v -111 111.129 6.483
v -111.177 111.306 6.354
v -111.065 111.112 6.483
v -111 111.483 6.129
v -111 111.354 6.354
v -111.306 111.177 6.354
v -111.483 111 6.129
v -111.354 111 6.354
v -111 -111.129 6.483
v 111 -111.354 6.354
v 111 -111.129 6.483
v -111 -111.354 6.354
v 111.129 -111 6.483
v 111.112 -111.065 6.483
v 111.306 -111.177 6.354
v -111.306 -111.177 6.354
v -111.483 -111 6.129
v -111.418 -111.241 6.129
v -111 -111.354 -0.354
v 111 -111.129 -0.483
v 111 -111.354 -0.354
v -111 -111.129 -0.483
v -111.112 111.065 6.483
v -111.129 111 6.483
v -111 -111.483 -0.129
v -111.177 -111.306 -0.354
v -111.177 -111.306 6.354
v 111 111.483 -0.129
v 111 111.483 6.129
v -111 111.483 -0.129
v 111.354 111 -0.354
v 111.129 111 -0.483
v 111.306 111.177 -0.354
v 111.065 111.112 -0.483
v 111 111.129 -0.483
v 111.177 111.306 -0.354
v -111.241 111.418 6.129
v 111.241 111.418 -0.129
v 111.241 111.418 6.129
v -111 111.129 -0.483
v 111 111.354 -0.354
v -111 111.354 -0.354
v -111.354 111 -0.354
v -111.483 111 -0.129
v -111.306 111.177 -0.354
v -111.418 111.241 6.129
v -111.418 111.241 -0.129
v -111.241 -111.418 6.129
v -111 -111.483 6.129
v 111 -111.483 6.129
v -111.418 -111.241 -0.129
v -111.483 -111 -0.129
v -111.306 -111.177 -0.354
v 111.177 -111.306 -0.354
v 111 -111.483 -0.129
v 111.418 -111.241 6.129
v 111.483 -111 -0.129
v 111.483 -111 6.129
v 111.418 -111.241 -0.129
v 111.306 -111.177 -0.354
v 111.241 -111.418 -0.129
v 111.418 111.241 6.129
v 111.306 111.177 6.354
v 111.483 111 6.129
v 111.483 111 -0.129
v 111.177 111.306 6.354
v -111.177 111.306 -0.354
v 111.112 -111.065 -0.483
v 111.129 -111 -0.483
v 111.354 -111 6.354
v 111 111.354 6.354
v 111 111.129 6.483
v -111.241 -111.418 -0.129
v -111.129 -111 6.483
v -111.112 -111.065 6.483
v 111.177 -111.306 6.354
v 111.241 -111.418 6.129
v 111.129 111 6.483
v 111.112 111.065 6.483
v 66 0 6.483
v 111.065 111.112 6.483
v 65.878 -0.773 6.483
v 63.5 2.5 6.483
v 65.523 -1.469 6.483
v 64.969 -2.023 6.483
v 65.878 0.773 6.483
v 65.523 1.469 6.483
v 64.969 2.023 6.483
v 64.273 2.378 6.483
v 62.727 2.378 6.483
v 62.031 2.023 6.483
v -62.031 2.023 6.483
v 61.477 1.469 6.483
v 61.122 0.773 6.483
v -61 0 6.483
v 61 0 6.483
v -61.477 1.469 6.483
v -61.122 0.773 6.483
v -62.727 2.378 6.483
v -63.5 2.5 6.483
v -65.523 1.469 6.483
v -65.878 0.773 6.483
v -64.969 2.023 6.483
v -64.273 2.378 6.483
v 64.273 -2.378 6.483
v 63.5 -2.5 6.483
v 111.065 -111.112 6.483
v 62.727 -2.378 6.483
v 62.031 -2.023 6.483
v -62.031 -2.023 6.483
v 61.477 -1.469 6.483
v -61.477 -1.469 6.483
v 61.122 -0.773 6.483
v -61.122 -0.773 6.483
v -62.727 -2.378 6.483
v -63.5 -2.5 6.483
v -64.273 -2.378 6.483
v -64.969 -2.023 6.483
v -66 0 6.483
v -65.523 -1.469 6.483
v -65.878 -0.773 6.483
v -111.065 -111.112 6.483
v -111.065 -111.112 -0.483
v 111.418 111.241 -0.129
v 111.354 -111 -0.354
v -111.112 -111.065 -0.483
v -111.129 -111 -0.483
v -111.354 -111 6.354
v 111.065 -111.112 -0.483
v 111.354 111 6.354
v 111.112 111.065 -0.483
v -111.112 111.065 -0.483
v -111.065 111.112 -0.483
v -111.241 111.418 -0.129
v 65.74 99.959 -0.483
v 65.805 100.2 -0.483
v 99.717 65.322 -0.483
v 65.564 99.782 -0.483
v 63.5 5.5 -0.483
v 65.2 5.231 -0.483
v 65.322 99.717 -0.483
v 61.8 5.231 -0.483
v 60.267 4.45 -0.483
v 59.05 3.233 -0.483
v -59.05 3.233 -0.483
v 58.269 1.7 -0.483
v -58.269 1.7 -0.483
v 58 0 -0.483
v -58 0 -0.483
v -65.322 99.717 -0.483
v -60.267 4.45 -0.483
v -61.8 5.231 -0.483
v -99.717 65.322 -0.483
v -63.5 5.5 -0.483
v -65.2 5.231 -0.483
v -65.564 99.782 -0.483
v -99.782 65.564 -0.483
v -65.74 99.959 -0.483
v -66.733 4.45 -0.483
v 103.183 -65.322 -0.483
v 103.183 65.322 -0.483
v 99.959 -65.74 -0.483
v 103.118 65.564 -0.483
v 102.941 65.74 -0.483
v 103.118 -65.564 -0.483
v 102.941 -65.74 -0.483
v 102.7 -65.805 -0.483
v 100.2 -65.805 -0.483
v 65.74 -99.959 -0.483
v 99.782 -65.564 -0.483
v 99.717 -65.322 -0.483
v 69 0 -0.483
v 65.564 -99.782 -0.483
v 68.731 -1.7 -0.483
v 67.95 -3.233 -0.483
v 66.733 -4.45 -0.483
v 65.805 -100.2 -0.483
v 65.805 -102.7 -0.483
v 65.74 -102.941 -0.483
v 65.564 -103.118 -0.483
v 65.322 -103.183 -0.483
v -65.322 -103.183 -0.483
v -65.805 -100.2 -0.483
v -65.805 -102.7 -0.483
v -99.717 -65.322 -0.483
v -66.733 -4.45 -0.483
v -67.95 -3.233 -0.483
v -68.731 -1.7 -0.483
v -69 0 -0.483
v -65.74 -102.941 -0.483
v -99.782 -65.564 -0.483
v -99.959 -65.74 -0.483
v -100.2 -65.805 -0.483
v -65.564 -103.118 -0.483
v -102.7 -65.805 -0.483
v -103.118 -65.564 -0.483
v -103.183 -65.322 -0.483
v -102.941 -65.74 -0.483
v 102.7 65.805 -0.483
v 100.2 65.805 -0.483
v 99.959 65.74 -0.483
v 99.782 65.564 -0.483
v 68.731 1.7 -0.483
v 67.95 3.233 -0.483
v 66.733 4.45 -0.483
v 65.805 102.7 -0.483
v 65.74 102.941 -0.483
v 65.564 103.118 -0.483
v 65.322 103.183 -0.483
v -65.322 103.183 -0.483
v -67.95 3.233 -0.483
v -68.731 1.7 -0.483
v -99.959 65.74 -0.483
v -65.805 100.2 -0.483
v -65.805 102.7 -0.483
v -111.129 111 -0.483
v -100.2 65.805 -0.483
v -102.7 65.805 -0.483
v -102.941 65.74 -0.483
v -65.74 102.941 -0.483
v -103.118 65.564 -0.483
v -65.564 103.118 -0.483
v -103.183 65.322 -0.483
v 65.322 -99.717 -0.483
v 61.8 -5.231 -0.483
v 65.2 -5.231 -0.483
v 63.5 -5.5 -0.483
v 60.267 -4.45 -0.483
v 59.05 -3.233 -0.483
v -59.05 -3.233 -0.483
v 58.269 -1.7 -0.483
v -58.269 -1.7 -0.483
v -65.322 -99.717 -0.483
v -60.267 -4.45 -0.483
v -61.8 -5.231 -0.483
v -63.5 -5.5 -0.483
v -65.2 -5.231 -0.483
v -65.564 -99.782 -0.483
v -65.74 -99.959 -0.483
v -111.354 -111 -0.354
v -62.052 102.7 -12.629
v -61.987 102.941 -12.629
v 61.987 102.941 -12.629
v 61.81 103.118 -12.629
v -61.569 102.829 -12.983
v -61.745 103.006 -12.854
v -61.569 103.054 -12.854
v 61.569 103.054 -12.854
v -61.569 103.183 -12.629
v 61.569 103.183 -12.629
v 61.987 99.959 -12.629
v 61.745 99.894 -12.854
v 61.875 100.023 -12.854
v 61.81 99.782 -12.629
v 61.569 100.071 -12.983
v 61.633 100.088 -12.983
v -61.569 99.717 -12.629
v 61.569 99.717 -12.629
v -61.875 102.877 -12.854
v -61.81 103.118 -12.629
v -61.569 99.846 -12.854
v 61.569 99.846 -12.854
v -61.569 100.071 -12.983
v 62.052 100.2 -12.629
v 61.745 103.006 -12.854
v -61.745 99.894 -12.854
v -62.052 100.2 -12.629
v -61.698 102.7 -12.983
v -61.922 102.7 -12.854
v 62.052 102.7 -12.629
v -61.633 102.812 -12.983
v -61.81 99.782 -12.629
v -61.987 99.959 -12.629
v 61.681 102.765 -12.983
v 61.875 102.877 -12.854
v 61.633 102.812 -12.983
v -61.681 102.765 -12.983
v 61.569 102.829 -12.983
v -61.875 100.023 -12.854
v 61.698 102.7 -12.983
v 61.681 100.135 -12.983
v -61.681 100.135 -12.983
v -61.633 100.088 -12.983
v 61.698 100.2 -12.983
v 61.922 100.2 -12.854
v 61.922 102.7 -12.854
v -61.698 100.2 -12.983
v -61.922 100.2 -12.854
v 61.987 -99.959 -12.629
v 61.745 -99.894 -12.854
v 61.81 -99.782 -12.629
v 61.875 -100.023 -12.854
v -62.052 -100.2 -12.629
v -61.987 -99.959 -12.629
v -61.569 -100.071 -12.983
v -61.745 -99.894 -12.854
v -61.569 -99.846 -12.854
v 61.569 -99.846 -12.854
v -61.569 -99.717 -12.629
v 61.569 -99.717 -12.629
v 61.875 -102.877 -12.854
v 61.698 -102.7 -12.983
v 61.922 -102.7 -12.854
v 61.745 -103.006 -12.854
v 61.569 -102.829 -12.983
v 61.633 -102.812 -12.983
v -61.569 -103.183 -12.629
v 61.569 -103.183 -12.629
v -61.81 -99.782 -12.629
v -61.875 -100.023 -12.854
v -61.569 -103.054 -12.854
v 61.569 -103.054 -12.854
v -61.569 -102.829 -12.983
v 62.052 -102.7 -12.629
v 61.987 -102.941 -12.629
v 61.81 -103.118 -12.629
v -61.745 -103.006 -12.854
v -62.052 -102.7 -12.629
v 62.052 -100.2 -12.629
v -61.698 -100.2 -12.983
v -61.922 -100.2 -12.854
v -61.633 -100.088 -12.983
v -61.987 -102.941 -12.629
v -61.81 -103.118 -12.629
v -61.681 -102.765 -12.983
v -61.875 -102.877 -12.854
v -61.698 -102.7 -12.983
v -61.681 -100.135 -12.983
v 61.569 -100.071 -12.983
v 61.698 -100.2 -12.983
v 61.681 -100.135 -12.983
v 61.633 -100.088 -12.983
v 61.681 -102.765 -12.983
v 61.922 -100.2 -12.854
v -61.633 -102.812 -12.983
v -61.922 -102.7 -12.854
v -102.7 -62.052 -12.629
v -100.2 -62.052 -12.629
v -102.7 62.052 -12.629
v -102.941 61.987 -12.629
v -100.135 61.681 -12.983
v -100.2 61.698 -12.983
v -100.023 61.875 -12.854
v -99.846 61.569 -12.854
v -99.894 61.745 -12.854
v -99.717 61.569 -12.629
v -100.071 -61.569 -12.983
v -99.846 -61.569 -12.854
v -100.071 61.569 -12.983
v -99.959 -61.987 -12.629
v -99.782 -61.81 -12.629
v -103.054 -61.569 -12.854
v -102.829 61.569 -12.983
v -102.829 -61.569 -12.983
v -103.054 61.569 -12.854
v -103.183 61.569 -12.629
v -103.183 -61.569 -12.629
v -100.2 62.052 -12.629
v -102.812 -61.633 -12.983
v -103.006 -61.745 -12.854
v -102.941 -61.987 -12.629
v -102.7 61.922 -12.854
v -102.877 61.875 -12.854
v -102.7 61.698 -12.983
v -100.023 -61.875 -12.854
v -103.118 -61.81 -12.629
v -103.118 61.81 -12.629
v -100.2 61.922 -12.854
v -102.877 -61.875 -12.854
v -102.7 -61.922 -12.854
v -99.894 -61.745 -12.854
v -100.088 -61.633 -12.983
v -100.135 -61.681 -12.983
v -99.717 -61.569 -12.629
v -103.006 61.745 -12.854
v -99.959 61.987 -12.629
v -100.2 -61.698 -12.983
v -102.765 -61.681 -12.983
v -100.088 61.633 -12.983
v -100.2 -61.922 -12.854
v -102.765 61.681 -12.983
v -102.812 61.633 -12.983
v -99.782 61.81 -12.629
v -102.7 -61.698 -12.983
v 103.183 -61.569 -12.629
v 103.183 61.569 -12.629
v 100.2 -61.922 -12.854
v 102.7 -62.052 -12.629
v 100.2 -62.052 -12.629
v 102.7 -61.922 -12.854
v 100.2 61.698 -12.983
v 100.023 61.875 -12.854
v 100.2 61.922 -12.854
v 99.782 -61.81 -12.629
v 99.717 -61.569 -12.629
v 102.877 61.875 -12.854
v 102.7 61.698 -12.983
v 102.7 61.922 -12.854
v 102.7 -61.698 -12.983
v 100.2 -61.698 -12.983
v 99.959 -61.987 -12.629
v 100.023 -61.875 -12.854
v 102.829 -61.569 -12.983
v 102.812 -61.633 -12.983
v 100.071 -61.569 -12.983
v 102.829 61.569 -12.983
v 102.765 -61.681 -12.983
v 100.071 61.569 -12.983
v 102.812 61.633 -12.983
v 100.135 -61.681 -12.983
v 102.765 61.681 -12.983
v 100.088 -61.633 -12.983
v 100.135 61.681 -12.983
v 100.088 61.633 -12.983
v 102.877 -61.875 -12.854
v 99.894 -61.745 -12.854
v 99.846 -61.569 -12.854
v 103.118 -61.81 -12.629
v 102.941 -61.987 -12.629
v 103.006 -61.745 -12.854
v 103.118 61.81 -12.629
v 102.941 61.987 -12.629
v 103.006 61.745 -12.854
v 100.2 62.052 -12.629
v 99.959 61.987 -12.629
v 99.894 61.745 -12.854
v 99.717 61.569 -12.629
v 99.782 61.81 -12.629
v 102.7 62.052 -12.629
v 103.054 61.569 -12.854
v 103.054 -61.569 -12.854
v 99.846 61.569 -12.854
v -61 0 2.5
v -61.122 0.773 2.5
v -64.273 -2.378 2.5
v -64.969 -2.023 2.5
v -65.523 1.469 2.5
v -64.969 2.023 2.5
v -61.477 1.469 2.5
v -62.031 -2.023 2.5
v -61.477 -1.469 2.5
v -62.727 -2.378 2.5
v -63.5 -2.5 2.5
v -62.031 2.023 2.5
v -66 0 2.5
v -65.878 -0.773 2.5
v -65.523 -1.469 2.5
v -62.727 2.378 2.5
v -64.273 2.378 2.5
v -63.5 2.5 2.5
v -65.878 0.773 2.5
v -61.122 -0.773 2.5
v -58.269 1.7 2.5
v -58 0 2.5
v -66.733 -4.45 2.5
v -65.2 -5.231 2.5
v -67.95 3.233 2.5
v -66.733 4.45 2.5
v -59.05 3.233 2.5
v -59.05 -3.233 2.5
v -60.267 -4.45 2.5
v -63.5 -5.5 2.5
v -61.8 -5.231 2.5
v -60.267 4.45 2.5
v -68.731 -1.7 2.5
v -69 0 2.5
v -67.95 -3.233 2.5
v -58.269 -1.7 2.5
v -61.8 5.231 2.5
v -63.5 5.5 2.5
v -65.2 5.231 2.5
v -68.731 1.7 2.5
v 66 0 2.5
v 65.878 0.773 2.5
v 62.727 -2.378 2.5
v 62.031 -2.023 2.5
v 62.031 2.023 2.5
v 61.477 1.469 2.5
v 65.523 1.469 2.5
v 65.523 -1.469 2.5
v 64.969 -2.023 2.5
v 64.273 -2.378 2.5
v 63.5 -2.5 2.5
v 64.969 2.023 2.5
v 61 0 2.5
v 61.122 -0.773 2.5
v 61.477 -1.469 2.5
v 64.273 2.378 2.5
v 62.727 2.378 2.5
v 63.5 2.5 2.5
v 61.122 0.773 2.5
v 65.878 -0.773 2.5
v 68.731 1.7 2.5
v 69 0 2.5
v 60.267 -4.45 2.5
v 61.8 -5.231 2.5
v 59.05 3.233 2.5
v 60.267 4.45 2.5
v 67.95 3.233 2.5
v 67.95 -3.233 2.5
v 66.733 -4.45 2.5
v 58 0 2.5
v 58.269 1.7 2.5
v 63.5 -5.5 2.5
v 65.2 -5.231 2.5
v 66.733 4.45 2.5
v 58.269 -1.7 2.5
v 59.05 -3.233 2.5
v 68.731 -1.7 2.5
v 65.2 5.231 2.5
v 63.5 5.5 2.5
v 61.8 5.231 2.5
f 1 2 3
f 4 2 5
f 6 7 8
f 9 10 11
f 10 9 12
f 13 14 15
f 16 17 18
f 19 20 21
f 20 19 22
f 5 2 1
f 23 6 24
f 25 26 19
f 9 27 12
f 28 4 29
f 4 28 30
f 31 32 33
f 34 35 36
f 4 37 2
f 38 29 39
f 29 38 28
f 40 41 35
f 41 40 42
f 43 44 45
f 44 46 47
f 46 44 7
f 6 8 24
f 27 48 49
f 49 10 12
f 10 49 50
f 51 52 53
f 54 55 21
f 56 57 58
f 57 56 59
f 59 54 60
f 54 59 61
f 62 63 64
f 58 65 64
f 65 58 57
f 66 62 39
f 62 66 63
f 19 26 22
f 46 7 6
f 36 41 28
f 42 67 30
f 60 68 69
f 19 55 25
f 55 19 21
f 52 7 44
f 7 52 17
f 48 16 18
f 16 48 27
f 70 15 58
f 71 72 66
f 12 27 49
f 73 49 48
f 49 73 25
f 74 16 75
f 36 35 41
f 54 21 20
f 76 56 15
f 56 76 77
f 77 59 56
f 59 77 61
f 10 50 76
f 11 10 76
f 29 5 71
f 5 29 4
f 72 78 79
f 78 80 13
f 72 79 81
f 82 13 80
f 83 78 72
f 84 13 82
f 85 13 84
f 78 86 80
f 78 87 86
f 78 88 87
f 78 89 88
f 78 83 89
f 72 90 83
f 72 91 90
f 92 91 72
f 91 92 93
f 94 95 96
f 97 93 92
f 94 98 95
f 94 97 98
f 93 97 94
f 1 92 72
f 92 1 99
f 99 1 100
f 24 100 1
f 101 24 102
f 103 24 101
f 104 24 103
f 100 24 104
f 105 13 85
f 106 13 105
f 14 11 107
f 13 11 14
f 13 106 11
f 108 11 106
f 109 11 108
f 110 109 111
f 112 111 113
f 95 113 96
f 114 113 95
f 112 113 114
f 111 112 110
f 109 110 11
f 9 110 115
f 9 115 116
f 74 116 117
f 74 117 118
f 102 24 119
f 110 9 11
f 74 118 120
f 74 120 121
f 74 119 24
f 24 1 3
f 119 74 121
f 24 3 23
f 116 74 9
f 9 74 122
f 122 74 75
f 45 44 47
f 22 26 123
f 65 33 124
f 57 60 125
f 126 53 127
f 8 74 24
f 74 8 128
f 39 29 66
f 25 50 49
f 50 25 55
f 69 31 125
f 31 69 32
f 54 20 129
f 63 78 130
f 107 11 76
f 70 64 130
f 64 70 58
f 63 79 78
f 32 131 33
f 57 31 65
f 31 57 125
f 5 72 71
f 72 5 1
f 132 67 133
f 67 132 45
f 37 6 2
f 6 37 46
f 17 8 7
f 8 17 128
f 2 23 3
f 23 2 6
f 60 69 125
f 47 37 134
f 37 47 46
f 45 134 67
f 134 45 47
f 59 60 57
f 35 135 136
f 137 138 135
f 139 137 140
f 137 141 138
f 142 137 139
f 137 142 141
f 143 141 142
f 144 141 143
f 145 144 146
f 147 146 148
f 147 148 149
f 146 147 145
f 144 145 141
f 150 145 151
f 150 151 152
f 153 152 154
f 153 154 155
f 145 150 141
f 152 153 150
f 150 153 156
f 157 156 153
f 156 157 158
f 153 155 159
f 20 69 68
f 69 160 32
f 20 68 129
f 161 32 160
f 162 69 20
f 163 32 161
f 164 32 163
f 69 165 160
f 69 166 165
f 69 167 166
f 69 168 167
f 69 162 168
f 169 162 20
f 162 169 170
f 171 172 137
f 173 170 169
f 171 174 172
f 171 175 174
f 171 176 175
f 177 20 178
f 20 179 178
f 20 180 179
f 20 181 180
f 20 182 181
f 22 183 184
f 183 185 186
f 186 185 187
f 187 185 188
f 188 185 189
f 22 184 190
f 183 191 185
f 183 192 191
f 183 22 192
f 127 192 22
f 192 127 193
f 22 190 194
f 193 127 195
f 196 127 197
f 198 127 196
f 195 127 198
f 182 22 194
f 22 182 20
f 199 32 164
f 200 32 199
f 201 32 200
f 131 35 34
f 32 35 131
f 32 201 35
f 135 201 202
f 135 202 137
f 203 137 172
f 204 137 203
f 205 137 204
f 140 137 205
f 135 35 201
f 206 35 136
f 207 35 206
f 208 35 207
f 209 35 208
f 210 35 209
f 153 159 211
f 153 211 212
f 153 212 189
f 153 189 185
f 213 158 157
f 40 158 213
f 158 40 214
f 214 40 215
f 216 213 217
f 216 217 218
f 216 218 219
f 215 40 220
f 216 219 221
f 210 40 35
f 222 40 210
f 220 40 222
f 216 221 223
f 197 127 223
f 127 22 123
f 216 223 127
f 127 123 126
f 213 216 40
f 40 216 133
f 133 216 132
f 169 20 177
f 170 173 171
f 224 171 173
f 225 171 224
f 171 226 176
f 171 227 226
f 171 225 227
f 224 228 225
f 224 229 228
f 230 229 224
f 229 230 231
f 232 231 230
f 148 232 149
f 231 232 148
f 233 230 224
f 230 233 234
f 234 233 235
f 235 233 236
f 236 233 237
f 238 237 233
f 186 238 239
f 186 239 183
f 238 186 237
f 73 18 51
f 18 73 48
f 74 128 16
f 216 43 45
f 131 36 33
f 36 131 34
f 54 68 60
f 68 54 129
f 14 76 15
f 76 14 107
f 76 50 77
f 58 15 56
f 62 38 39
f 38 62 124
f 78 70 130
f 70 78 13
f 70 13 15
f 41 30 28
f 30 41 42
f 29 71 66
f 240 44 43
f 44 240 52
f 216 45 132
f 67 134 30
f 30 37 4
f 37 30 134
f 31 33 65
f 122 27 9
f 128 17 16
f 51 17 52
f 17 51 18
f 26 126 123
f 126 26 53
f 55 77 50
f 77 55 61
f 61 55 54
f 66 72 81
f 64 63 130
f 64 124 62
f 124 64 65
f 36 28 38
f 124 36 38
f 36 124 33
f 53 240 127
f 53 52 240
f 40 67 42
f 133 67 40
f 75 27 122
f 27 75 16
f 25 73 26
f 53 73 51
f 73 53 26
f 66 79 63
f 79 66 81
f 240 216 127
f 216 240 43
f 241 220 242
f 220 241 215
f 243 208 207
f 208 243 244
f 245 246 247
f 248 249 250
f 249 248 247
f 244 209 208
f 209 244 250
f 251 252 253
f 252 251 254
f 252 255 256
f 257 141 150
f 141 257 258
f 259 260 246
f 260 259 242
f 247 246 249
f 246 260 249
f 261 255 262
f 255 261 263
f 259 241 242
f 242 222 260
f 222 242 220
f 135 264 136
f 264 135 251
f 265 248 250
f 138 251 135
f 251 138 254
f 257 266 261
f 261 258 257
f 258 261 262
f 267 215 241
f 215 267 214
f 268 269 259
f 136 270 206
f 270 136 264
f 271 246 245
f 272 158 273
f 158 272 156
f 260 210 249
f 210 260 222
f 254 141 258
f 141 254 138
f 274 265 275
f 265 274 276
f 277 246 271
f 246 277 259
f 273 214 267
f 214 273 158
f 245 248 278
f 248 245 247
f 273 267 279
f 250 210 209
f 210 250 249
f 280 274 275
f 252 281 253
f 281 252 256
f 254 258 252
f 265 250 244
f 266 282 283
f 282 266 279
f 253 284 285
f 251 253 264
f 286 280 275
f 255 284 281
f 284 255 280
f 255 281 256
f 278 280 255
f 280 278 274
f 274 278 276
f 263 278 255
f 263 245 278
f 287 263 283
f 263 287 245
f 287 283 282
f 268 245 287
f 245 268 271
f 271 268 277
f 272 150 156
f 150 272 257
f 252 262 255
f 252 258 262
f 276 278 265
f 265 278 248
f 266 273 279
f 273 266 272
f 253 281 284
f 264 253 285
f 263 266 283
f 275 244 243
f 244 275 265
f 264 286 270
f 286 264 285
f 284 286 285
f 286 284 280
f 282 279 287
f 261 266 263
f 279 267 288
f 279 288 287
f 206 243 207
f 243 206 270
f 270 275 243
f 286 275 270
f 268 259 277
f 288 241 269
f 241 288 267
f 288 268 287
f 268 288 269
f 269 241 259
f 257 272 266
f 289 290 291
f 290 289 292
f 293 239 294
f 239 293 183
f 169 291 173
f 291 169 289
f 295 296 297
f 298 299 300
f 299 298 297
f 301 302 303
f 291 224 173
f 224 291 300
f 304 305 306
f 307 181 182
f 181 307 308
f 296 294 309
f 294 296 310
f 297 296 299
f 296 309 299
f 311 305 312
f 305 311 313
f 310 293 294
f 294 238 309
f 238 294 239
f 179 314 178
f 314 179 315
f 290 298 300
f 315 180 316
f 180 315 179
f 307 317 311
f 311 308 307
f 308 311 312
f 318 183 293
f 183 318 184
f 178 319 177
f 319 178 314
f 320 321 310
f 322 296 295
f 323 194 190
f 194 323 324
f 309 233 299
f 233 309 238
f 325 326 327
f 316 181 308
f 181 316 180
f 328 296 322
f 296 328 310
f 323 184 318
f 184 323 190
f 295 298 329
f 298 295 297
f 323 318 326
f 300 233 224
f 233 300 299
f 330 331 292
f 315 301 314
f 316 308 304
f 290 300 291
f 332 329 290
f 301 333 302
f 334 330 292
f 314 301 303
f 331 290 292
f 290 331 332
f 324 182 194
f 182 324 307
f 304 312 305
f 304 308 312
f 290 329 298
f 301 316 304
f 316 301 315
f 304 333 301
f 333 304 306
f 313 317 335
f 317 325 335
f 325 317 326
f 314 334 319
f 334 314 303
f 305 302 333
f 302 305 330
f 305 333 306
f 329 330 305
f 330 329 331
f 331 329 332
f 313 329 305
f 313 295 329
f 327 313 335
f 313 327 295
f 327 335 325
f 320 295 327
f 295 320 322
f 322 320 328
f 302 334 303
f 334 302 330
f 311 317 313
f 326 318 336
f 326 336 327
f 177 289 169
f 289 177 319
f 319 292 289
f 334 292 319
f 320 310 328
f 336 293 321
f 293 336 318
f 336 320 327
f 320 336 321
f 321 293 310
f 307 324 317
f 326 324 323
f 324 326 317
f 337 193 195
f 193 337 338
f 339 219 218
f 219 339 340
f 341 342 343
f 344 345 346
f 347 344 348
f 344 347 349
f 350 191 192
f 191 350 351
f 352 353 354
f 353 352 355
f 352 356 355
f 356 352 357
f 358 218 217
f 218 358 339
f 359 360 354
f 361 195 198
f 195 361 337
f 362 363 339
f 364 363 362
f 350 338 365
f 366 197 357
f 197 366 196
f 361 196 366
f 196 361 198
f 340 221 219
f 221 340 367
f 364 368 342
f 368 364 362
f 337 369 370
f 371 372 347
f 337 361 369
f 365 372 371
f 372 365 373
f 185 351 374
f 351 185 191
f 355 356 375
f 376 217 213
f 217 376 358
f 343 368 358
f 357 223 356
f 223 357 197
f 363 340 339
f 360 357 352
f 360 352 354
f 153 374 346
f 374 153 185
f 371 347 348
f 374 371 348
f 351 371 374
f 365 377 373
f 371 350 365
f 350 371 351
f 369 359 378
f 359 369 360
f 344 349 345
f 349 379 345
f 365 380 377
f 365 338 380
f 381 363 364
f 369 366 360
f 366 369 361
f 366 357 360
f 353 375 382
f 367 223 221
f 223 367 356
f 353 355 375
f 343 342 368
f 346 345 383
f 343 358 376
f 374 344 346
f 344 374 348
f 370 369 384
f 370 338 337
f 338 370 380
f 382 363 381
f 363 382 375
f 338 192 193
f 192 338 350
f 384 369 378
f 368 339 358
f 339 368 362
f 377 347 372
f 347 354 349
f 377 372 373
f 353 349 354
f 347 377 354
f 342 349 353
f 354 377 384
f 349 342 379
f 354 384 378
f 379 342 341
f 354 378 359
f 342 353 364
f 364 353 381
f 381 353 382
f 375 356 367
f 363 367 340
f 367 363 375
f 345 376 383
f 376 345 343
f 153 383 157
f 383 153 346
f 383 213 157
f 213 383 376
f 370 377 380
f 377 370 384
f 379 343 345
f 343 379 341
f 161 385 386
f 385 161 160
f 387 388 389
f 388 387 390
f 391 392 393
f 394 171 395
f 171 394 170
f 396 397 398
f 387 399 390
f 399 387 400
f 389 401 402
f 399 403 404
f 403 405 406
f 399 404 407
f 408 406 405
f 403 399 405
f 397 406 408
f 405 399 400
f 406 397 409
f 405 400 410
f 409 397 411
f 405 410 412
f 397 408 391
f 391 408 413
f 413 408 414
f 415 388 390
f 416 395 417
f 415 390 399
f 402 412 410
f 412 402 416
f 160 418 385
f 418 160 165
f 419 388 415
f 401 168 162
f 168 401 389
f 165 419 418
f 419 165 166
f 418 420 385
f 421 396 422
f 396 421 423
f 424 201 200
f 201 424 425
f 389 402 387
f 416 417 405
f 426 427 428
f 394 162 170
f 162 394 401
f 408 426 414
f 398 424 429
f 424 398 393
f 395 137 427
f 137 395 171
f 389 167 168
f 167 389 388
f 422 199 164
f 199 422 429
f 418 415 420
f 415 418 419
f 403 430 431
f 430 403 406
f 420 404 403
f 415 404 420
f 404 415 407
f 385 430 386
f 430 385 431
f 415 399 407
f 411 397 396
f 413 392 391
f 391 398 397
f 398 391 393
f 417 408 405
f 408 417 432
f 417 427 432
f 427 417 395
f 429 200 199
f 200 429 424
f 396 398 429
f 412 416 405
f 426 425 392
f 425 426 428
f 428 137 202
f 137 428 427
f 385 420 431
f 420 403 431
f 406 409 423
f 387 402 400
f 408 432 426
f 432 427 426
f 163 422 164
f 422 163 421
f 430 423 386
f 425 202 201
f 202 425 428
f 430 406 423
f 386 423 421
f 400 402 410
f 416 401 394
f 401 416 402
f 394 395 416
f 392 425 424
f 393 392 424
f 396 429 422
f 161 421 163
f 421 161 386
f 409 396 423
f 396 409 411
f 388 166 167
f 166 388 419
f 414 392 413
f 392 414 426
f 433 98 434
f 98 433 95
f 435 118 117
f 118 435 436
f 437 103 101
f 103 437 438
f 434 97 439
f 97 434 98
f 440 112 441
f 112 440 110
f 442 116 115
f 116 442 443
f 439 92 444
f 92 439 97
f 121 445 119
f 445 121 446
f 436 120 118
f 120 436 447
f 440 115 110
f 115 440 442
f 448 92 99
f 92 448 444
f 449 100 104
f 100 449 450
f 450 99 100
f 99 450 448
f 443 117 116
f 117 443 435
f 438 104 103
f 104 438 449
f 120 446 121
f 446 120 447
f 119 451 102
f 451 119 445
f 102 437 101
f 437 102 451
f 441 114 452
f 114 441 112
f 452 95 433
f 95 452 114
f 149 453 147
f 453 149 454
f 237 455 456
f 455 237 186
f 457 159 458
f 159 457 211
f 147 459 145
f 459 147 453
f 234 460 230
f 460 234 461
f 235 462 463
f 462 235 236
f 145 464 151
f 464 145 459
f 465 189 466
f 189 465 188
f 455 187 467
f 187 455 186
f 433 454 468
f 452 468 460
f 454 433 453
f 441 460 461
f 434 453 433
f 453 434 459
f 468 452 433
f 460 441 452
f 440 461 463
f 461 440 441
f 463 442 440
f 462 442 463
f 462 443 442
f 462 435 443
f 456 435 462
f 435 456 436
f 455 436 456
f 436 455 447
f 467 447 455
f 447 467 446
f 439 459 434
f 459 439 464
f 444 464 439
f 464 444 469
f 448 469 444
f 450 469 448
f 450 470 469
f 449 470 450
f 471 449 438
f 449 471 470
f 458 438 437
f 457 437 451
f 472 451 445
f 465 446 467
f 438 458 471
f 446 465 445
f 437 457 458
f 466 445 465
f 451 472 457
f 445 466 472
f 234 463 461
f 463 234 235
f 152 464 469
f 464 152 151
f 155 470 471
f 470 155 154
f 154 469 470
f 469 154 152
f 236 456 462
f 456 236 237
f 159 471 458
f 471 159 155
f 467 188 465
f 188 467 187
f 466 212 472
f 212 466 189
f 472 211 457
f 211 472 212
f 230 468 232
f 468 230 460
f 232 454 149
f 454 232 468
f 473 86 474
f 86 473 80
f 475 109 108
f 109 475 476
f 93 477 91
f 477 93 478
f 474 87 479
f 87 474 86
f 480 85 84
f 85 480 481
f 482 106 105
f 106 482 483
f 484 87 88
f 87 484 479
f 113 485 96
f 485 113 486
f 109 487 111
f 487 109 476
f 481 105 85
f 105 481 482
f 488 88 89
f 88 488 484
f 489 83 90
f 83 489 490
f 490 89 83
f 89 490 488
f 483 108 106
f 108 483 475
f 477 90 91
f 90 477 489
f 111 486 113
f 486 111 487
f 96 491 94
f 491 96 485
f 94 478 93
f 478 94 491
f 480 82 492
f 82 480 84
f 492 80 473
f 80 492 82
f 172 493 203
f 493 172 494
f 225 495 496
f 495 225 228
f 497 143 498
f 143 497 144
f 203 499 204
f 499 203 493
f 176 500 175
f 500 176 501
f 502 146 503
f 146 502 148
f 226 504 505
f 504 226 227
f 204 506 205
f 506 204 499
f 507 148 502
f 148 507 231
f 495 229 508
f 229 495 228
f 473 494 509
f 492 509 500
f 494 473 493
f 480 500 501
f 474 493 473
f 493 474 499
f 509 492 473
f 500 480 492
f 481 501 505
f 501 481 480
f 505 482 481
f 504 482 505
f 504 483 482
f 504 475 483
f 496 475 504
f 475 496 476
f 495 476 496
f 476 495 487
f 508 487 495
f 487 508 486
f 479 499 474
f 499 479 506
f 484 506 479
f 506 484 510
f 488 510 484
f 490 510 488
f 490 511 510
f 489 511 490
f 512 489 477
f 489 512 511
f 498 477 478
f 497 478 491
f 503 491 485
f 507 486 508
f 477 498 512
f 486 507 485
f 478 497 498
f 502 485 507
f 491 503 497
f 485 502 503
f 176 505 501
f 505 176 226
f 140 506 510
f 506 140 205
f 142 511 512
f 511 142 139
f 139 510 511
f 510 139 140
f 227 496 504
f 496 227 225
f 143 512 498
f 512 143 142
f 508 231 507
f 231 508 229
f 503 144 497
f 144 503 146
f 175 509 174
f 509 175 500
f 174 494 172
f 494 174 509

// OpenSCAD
strip_thickness_mm = 0.5;
strip_width_mm = 8.5;
strip_retention_wall_mm = 1.5;
strip_retention_wall_angle = 40;
strip_separation_mm = 1;
strip_depth_mm = 1;
bracket_width_mm = strip_width_mm * 2 + 3 * strip_separation_mm;
bracket_depth_mm = 4;
mirror_thickness_mm = 1.2;
mirror_retention_depth_mm = 3;
mirror_retention_inset_mm = 1.2;
slot_tolerance_mm = 0.4;
mirror_width_mm = 200;

mirror_retention_block_width_mm = mirror_retention_depth_mm + bracket_depth_mm / sqrt(2);
corner_piece_offset_mm = bracket_width_mm / 2 - bracket_depth_mm / 2 + (mirror_retention_block_width_mm - mirror_retention_depth_mm) * sqrt(2);
corner_piece_inset_mm = 6;
floor_inset_mm = 38;
base_chamfer_height_mm = 12;
top_corner_chamfer_mm = 12;
top_pin_area_mm = 21;
corner_piece_hole_depth_mm = 8;
lid_retention_thickness_mm = 2.5;
lid_retention_width_mm = 5 * 25.4;
lid_retention_height_mm = 12.5;
lid_retention_angle = 18;
floor_size_mm = 201;
ceiling_size_mm = floor_size_mm + 2 * lid_retention_thickness_mm;
top_thickness_mm = corner_piece_hole_depth_mm + 4;
lid_thickness_mm = 6;
lid_fillet_mm = 1;
lid_overhang_mm = 8;

lid_handle_hole_separation_mm = 5 * 25.4;
lid_handle_hole_size_mm = 5;
lid_handle_screw_head_size_mm = 11;
lid_handle_screw_head_thickness_mm = 2;

horizontal_bracket_retention_width_mm = 6 * 25.4;
horizontal_bracket_retention_wall_thickness_mm = 2.5;
horizontal_bracket_retention_tolerance_mm = 0.3;

pin_width_mm = 10;
pin_depth_mm = 8;
pin_inset_mm = 10;
pin_thickness_mm = 4;
pin_top_thickness_mm = 3;
pin_insertion_easing_mm = 0.6;

pin_insertion_depth_mm = pin_depth_mm - pin_top_thickness_mm;
pin_insertion_tolerance_mm = 0.3;

pin_insertion_extra_mm = 1;

module pin()
{
  difference()
  {
    cube([2 * pin_inset_mm, pin_width_mm, pin_depth_mm], center = true);
    
    translate([0, 0, -pin_top_thickness_mm])
    cube([2 * pin_inset_mm - 2 * pin_thickness_mm, pin_width_mm * 2, pin_depth_mm], center = true);

    for (i = [-1, 1])
    {
      translate([-i * (pin_inset_mm - pin_thickness_mm * 1.5), 0, 0.5 * pin_insertion_depth_mm - 0.5 * pin_depth_mm])
      multmatrix(
        [[1, 0, i * pin_insertion_easing_mm / (2 * pin_insertion_depth_mm), 0],
         [0, 1, 0, 0],
         [0, 0, 1, 0],
         [0, 0, 0, 1]])
      cube([pin_thickness_mm, 2 * pin_width_mm, pin_insertion_depth_mm], center = true);
    }
  }
}

strip_retention_wall_skew_factor = tan(strip_retention_wall_angle);
strip_retention_wall_x_mm = strip_retention_wall_mm * strip_retention_wall_skew_factor;

module profile(height_mm)
{
  translate([0, 0, height_mm * 0.5])
  cube([bracket_width_mm, bracket_depth_mm, height_mm], center = true);

  for (i = [-1, 1])
  {
    scale([-i, 1, 1])
    intersection()
    {
      translate([-bracket_width_mm / 2, 0, 0])
      translate([bracket_depth_mm / sqrt(2) / 2, bracket_depth_mm * (1 - sqrt(2) / 2) / 2, 0.5 * height_mm])
      rotate([0, 0, 45])
      difference()
      {
        translate([-0.5 * mirror_retention_block_width_mm, 0, 0])
        cube([mirror_retention_block_width_mm, bracket_depth_mm, height_mm], center = true);
      }

      union()
      {
        translate([-3.5 * bracket_width_mm, 0, 0])
        cube([6 * bracket_width_mm, 6 * bracket_width_mm, 4 * height_mm], center = true);

        translate([0, -3.5 * bracket_depth_mm, 0])
        cube([4 * bracket_width_mm, 6 * bracket_depth_mm, 4 * height_mm], center = true);
      }
    }
  }
}

base_chamfer_generation_side_mm = mirror_width_mm + corner_piece_offset_mm * sqrt(2) * 2 + corner_piece_inset_mm * 2 + top_thickness_mm * 2;
base_side_mm = mirror_width_mm + corner_piece_offset_mm * sqrt(2) * 2 + corner_piece_inset_mm * 2 + base_chamfer_height_mm * 2;
top_side_mm = mirror_width_mm + corner_piece_offset_mm * sqrt(2) * 2 + corner_piece_inset_mm * 2;

echo(base_chamfer_generation_side_mm);

module lid()
{
  difference()
  {
    minkowski()
    {
      union()
      {
        linear_extrude(height = lid_thickness_mm)
        square(ceiling_size_mm + 2 * lid_overhang_mm, center = true);
        
        lid_retention_skew_mm = lid_retention_height_mm * sin(lid_retention_angle);

        for (i = [0 : 3])
          rotate([0, 0, i * 90])
          translate([0, ceiling_size_mm / 2 - lid_retention_thickness_mm / 2 - 0.3, -lid_retention_height_mm / 2])
          for (j = [-1 : 1])
            multmatrix(
              [[1, 0, sin(lid_retention_angle) * j, lid_retention_skew_mm * j],
               [0, 1, 0, 0],
               [0, 0, 1, 0],
               [0, 0, 0, 1]])
            cube([lid_retention_width_mm - lid_retention_skew_mm * 2, lid_retention_thickness_mm, lid_retention_height_mm], center = true);
      }

      sphere(d = lid_fillet_mm, $fn = 12);
    }
    
    for (i = [-1, 1])
      translate([i * lid_handle_hole_separation_mm / 2, 0, 0])
      {
        cylinder(h = lid_thickness_mm * 4, d = lid_handle_hole_size_mm, $fn = 20, center = true);
        translate([0, 0, -lid_fillet_mm / 2])
        cylinder(h = lid_handle_screw_head_thickness_mm + 1, d = lid_handle_screw_head_size_mm, $fn = 20);
      }
  }
}

lid();
//pin();
